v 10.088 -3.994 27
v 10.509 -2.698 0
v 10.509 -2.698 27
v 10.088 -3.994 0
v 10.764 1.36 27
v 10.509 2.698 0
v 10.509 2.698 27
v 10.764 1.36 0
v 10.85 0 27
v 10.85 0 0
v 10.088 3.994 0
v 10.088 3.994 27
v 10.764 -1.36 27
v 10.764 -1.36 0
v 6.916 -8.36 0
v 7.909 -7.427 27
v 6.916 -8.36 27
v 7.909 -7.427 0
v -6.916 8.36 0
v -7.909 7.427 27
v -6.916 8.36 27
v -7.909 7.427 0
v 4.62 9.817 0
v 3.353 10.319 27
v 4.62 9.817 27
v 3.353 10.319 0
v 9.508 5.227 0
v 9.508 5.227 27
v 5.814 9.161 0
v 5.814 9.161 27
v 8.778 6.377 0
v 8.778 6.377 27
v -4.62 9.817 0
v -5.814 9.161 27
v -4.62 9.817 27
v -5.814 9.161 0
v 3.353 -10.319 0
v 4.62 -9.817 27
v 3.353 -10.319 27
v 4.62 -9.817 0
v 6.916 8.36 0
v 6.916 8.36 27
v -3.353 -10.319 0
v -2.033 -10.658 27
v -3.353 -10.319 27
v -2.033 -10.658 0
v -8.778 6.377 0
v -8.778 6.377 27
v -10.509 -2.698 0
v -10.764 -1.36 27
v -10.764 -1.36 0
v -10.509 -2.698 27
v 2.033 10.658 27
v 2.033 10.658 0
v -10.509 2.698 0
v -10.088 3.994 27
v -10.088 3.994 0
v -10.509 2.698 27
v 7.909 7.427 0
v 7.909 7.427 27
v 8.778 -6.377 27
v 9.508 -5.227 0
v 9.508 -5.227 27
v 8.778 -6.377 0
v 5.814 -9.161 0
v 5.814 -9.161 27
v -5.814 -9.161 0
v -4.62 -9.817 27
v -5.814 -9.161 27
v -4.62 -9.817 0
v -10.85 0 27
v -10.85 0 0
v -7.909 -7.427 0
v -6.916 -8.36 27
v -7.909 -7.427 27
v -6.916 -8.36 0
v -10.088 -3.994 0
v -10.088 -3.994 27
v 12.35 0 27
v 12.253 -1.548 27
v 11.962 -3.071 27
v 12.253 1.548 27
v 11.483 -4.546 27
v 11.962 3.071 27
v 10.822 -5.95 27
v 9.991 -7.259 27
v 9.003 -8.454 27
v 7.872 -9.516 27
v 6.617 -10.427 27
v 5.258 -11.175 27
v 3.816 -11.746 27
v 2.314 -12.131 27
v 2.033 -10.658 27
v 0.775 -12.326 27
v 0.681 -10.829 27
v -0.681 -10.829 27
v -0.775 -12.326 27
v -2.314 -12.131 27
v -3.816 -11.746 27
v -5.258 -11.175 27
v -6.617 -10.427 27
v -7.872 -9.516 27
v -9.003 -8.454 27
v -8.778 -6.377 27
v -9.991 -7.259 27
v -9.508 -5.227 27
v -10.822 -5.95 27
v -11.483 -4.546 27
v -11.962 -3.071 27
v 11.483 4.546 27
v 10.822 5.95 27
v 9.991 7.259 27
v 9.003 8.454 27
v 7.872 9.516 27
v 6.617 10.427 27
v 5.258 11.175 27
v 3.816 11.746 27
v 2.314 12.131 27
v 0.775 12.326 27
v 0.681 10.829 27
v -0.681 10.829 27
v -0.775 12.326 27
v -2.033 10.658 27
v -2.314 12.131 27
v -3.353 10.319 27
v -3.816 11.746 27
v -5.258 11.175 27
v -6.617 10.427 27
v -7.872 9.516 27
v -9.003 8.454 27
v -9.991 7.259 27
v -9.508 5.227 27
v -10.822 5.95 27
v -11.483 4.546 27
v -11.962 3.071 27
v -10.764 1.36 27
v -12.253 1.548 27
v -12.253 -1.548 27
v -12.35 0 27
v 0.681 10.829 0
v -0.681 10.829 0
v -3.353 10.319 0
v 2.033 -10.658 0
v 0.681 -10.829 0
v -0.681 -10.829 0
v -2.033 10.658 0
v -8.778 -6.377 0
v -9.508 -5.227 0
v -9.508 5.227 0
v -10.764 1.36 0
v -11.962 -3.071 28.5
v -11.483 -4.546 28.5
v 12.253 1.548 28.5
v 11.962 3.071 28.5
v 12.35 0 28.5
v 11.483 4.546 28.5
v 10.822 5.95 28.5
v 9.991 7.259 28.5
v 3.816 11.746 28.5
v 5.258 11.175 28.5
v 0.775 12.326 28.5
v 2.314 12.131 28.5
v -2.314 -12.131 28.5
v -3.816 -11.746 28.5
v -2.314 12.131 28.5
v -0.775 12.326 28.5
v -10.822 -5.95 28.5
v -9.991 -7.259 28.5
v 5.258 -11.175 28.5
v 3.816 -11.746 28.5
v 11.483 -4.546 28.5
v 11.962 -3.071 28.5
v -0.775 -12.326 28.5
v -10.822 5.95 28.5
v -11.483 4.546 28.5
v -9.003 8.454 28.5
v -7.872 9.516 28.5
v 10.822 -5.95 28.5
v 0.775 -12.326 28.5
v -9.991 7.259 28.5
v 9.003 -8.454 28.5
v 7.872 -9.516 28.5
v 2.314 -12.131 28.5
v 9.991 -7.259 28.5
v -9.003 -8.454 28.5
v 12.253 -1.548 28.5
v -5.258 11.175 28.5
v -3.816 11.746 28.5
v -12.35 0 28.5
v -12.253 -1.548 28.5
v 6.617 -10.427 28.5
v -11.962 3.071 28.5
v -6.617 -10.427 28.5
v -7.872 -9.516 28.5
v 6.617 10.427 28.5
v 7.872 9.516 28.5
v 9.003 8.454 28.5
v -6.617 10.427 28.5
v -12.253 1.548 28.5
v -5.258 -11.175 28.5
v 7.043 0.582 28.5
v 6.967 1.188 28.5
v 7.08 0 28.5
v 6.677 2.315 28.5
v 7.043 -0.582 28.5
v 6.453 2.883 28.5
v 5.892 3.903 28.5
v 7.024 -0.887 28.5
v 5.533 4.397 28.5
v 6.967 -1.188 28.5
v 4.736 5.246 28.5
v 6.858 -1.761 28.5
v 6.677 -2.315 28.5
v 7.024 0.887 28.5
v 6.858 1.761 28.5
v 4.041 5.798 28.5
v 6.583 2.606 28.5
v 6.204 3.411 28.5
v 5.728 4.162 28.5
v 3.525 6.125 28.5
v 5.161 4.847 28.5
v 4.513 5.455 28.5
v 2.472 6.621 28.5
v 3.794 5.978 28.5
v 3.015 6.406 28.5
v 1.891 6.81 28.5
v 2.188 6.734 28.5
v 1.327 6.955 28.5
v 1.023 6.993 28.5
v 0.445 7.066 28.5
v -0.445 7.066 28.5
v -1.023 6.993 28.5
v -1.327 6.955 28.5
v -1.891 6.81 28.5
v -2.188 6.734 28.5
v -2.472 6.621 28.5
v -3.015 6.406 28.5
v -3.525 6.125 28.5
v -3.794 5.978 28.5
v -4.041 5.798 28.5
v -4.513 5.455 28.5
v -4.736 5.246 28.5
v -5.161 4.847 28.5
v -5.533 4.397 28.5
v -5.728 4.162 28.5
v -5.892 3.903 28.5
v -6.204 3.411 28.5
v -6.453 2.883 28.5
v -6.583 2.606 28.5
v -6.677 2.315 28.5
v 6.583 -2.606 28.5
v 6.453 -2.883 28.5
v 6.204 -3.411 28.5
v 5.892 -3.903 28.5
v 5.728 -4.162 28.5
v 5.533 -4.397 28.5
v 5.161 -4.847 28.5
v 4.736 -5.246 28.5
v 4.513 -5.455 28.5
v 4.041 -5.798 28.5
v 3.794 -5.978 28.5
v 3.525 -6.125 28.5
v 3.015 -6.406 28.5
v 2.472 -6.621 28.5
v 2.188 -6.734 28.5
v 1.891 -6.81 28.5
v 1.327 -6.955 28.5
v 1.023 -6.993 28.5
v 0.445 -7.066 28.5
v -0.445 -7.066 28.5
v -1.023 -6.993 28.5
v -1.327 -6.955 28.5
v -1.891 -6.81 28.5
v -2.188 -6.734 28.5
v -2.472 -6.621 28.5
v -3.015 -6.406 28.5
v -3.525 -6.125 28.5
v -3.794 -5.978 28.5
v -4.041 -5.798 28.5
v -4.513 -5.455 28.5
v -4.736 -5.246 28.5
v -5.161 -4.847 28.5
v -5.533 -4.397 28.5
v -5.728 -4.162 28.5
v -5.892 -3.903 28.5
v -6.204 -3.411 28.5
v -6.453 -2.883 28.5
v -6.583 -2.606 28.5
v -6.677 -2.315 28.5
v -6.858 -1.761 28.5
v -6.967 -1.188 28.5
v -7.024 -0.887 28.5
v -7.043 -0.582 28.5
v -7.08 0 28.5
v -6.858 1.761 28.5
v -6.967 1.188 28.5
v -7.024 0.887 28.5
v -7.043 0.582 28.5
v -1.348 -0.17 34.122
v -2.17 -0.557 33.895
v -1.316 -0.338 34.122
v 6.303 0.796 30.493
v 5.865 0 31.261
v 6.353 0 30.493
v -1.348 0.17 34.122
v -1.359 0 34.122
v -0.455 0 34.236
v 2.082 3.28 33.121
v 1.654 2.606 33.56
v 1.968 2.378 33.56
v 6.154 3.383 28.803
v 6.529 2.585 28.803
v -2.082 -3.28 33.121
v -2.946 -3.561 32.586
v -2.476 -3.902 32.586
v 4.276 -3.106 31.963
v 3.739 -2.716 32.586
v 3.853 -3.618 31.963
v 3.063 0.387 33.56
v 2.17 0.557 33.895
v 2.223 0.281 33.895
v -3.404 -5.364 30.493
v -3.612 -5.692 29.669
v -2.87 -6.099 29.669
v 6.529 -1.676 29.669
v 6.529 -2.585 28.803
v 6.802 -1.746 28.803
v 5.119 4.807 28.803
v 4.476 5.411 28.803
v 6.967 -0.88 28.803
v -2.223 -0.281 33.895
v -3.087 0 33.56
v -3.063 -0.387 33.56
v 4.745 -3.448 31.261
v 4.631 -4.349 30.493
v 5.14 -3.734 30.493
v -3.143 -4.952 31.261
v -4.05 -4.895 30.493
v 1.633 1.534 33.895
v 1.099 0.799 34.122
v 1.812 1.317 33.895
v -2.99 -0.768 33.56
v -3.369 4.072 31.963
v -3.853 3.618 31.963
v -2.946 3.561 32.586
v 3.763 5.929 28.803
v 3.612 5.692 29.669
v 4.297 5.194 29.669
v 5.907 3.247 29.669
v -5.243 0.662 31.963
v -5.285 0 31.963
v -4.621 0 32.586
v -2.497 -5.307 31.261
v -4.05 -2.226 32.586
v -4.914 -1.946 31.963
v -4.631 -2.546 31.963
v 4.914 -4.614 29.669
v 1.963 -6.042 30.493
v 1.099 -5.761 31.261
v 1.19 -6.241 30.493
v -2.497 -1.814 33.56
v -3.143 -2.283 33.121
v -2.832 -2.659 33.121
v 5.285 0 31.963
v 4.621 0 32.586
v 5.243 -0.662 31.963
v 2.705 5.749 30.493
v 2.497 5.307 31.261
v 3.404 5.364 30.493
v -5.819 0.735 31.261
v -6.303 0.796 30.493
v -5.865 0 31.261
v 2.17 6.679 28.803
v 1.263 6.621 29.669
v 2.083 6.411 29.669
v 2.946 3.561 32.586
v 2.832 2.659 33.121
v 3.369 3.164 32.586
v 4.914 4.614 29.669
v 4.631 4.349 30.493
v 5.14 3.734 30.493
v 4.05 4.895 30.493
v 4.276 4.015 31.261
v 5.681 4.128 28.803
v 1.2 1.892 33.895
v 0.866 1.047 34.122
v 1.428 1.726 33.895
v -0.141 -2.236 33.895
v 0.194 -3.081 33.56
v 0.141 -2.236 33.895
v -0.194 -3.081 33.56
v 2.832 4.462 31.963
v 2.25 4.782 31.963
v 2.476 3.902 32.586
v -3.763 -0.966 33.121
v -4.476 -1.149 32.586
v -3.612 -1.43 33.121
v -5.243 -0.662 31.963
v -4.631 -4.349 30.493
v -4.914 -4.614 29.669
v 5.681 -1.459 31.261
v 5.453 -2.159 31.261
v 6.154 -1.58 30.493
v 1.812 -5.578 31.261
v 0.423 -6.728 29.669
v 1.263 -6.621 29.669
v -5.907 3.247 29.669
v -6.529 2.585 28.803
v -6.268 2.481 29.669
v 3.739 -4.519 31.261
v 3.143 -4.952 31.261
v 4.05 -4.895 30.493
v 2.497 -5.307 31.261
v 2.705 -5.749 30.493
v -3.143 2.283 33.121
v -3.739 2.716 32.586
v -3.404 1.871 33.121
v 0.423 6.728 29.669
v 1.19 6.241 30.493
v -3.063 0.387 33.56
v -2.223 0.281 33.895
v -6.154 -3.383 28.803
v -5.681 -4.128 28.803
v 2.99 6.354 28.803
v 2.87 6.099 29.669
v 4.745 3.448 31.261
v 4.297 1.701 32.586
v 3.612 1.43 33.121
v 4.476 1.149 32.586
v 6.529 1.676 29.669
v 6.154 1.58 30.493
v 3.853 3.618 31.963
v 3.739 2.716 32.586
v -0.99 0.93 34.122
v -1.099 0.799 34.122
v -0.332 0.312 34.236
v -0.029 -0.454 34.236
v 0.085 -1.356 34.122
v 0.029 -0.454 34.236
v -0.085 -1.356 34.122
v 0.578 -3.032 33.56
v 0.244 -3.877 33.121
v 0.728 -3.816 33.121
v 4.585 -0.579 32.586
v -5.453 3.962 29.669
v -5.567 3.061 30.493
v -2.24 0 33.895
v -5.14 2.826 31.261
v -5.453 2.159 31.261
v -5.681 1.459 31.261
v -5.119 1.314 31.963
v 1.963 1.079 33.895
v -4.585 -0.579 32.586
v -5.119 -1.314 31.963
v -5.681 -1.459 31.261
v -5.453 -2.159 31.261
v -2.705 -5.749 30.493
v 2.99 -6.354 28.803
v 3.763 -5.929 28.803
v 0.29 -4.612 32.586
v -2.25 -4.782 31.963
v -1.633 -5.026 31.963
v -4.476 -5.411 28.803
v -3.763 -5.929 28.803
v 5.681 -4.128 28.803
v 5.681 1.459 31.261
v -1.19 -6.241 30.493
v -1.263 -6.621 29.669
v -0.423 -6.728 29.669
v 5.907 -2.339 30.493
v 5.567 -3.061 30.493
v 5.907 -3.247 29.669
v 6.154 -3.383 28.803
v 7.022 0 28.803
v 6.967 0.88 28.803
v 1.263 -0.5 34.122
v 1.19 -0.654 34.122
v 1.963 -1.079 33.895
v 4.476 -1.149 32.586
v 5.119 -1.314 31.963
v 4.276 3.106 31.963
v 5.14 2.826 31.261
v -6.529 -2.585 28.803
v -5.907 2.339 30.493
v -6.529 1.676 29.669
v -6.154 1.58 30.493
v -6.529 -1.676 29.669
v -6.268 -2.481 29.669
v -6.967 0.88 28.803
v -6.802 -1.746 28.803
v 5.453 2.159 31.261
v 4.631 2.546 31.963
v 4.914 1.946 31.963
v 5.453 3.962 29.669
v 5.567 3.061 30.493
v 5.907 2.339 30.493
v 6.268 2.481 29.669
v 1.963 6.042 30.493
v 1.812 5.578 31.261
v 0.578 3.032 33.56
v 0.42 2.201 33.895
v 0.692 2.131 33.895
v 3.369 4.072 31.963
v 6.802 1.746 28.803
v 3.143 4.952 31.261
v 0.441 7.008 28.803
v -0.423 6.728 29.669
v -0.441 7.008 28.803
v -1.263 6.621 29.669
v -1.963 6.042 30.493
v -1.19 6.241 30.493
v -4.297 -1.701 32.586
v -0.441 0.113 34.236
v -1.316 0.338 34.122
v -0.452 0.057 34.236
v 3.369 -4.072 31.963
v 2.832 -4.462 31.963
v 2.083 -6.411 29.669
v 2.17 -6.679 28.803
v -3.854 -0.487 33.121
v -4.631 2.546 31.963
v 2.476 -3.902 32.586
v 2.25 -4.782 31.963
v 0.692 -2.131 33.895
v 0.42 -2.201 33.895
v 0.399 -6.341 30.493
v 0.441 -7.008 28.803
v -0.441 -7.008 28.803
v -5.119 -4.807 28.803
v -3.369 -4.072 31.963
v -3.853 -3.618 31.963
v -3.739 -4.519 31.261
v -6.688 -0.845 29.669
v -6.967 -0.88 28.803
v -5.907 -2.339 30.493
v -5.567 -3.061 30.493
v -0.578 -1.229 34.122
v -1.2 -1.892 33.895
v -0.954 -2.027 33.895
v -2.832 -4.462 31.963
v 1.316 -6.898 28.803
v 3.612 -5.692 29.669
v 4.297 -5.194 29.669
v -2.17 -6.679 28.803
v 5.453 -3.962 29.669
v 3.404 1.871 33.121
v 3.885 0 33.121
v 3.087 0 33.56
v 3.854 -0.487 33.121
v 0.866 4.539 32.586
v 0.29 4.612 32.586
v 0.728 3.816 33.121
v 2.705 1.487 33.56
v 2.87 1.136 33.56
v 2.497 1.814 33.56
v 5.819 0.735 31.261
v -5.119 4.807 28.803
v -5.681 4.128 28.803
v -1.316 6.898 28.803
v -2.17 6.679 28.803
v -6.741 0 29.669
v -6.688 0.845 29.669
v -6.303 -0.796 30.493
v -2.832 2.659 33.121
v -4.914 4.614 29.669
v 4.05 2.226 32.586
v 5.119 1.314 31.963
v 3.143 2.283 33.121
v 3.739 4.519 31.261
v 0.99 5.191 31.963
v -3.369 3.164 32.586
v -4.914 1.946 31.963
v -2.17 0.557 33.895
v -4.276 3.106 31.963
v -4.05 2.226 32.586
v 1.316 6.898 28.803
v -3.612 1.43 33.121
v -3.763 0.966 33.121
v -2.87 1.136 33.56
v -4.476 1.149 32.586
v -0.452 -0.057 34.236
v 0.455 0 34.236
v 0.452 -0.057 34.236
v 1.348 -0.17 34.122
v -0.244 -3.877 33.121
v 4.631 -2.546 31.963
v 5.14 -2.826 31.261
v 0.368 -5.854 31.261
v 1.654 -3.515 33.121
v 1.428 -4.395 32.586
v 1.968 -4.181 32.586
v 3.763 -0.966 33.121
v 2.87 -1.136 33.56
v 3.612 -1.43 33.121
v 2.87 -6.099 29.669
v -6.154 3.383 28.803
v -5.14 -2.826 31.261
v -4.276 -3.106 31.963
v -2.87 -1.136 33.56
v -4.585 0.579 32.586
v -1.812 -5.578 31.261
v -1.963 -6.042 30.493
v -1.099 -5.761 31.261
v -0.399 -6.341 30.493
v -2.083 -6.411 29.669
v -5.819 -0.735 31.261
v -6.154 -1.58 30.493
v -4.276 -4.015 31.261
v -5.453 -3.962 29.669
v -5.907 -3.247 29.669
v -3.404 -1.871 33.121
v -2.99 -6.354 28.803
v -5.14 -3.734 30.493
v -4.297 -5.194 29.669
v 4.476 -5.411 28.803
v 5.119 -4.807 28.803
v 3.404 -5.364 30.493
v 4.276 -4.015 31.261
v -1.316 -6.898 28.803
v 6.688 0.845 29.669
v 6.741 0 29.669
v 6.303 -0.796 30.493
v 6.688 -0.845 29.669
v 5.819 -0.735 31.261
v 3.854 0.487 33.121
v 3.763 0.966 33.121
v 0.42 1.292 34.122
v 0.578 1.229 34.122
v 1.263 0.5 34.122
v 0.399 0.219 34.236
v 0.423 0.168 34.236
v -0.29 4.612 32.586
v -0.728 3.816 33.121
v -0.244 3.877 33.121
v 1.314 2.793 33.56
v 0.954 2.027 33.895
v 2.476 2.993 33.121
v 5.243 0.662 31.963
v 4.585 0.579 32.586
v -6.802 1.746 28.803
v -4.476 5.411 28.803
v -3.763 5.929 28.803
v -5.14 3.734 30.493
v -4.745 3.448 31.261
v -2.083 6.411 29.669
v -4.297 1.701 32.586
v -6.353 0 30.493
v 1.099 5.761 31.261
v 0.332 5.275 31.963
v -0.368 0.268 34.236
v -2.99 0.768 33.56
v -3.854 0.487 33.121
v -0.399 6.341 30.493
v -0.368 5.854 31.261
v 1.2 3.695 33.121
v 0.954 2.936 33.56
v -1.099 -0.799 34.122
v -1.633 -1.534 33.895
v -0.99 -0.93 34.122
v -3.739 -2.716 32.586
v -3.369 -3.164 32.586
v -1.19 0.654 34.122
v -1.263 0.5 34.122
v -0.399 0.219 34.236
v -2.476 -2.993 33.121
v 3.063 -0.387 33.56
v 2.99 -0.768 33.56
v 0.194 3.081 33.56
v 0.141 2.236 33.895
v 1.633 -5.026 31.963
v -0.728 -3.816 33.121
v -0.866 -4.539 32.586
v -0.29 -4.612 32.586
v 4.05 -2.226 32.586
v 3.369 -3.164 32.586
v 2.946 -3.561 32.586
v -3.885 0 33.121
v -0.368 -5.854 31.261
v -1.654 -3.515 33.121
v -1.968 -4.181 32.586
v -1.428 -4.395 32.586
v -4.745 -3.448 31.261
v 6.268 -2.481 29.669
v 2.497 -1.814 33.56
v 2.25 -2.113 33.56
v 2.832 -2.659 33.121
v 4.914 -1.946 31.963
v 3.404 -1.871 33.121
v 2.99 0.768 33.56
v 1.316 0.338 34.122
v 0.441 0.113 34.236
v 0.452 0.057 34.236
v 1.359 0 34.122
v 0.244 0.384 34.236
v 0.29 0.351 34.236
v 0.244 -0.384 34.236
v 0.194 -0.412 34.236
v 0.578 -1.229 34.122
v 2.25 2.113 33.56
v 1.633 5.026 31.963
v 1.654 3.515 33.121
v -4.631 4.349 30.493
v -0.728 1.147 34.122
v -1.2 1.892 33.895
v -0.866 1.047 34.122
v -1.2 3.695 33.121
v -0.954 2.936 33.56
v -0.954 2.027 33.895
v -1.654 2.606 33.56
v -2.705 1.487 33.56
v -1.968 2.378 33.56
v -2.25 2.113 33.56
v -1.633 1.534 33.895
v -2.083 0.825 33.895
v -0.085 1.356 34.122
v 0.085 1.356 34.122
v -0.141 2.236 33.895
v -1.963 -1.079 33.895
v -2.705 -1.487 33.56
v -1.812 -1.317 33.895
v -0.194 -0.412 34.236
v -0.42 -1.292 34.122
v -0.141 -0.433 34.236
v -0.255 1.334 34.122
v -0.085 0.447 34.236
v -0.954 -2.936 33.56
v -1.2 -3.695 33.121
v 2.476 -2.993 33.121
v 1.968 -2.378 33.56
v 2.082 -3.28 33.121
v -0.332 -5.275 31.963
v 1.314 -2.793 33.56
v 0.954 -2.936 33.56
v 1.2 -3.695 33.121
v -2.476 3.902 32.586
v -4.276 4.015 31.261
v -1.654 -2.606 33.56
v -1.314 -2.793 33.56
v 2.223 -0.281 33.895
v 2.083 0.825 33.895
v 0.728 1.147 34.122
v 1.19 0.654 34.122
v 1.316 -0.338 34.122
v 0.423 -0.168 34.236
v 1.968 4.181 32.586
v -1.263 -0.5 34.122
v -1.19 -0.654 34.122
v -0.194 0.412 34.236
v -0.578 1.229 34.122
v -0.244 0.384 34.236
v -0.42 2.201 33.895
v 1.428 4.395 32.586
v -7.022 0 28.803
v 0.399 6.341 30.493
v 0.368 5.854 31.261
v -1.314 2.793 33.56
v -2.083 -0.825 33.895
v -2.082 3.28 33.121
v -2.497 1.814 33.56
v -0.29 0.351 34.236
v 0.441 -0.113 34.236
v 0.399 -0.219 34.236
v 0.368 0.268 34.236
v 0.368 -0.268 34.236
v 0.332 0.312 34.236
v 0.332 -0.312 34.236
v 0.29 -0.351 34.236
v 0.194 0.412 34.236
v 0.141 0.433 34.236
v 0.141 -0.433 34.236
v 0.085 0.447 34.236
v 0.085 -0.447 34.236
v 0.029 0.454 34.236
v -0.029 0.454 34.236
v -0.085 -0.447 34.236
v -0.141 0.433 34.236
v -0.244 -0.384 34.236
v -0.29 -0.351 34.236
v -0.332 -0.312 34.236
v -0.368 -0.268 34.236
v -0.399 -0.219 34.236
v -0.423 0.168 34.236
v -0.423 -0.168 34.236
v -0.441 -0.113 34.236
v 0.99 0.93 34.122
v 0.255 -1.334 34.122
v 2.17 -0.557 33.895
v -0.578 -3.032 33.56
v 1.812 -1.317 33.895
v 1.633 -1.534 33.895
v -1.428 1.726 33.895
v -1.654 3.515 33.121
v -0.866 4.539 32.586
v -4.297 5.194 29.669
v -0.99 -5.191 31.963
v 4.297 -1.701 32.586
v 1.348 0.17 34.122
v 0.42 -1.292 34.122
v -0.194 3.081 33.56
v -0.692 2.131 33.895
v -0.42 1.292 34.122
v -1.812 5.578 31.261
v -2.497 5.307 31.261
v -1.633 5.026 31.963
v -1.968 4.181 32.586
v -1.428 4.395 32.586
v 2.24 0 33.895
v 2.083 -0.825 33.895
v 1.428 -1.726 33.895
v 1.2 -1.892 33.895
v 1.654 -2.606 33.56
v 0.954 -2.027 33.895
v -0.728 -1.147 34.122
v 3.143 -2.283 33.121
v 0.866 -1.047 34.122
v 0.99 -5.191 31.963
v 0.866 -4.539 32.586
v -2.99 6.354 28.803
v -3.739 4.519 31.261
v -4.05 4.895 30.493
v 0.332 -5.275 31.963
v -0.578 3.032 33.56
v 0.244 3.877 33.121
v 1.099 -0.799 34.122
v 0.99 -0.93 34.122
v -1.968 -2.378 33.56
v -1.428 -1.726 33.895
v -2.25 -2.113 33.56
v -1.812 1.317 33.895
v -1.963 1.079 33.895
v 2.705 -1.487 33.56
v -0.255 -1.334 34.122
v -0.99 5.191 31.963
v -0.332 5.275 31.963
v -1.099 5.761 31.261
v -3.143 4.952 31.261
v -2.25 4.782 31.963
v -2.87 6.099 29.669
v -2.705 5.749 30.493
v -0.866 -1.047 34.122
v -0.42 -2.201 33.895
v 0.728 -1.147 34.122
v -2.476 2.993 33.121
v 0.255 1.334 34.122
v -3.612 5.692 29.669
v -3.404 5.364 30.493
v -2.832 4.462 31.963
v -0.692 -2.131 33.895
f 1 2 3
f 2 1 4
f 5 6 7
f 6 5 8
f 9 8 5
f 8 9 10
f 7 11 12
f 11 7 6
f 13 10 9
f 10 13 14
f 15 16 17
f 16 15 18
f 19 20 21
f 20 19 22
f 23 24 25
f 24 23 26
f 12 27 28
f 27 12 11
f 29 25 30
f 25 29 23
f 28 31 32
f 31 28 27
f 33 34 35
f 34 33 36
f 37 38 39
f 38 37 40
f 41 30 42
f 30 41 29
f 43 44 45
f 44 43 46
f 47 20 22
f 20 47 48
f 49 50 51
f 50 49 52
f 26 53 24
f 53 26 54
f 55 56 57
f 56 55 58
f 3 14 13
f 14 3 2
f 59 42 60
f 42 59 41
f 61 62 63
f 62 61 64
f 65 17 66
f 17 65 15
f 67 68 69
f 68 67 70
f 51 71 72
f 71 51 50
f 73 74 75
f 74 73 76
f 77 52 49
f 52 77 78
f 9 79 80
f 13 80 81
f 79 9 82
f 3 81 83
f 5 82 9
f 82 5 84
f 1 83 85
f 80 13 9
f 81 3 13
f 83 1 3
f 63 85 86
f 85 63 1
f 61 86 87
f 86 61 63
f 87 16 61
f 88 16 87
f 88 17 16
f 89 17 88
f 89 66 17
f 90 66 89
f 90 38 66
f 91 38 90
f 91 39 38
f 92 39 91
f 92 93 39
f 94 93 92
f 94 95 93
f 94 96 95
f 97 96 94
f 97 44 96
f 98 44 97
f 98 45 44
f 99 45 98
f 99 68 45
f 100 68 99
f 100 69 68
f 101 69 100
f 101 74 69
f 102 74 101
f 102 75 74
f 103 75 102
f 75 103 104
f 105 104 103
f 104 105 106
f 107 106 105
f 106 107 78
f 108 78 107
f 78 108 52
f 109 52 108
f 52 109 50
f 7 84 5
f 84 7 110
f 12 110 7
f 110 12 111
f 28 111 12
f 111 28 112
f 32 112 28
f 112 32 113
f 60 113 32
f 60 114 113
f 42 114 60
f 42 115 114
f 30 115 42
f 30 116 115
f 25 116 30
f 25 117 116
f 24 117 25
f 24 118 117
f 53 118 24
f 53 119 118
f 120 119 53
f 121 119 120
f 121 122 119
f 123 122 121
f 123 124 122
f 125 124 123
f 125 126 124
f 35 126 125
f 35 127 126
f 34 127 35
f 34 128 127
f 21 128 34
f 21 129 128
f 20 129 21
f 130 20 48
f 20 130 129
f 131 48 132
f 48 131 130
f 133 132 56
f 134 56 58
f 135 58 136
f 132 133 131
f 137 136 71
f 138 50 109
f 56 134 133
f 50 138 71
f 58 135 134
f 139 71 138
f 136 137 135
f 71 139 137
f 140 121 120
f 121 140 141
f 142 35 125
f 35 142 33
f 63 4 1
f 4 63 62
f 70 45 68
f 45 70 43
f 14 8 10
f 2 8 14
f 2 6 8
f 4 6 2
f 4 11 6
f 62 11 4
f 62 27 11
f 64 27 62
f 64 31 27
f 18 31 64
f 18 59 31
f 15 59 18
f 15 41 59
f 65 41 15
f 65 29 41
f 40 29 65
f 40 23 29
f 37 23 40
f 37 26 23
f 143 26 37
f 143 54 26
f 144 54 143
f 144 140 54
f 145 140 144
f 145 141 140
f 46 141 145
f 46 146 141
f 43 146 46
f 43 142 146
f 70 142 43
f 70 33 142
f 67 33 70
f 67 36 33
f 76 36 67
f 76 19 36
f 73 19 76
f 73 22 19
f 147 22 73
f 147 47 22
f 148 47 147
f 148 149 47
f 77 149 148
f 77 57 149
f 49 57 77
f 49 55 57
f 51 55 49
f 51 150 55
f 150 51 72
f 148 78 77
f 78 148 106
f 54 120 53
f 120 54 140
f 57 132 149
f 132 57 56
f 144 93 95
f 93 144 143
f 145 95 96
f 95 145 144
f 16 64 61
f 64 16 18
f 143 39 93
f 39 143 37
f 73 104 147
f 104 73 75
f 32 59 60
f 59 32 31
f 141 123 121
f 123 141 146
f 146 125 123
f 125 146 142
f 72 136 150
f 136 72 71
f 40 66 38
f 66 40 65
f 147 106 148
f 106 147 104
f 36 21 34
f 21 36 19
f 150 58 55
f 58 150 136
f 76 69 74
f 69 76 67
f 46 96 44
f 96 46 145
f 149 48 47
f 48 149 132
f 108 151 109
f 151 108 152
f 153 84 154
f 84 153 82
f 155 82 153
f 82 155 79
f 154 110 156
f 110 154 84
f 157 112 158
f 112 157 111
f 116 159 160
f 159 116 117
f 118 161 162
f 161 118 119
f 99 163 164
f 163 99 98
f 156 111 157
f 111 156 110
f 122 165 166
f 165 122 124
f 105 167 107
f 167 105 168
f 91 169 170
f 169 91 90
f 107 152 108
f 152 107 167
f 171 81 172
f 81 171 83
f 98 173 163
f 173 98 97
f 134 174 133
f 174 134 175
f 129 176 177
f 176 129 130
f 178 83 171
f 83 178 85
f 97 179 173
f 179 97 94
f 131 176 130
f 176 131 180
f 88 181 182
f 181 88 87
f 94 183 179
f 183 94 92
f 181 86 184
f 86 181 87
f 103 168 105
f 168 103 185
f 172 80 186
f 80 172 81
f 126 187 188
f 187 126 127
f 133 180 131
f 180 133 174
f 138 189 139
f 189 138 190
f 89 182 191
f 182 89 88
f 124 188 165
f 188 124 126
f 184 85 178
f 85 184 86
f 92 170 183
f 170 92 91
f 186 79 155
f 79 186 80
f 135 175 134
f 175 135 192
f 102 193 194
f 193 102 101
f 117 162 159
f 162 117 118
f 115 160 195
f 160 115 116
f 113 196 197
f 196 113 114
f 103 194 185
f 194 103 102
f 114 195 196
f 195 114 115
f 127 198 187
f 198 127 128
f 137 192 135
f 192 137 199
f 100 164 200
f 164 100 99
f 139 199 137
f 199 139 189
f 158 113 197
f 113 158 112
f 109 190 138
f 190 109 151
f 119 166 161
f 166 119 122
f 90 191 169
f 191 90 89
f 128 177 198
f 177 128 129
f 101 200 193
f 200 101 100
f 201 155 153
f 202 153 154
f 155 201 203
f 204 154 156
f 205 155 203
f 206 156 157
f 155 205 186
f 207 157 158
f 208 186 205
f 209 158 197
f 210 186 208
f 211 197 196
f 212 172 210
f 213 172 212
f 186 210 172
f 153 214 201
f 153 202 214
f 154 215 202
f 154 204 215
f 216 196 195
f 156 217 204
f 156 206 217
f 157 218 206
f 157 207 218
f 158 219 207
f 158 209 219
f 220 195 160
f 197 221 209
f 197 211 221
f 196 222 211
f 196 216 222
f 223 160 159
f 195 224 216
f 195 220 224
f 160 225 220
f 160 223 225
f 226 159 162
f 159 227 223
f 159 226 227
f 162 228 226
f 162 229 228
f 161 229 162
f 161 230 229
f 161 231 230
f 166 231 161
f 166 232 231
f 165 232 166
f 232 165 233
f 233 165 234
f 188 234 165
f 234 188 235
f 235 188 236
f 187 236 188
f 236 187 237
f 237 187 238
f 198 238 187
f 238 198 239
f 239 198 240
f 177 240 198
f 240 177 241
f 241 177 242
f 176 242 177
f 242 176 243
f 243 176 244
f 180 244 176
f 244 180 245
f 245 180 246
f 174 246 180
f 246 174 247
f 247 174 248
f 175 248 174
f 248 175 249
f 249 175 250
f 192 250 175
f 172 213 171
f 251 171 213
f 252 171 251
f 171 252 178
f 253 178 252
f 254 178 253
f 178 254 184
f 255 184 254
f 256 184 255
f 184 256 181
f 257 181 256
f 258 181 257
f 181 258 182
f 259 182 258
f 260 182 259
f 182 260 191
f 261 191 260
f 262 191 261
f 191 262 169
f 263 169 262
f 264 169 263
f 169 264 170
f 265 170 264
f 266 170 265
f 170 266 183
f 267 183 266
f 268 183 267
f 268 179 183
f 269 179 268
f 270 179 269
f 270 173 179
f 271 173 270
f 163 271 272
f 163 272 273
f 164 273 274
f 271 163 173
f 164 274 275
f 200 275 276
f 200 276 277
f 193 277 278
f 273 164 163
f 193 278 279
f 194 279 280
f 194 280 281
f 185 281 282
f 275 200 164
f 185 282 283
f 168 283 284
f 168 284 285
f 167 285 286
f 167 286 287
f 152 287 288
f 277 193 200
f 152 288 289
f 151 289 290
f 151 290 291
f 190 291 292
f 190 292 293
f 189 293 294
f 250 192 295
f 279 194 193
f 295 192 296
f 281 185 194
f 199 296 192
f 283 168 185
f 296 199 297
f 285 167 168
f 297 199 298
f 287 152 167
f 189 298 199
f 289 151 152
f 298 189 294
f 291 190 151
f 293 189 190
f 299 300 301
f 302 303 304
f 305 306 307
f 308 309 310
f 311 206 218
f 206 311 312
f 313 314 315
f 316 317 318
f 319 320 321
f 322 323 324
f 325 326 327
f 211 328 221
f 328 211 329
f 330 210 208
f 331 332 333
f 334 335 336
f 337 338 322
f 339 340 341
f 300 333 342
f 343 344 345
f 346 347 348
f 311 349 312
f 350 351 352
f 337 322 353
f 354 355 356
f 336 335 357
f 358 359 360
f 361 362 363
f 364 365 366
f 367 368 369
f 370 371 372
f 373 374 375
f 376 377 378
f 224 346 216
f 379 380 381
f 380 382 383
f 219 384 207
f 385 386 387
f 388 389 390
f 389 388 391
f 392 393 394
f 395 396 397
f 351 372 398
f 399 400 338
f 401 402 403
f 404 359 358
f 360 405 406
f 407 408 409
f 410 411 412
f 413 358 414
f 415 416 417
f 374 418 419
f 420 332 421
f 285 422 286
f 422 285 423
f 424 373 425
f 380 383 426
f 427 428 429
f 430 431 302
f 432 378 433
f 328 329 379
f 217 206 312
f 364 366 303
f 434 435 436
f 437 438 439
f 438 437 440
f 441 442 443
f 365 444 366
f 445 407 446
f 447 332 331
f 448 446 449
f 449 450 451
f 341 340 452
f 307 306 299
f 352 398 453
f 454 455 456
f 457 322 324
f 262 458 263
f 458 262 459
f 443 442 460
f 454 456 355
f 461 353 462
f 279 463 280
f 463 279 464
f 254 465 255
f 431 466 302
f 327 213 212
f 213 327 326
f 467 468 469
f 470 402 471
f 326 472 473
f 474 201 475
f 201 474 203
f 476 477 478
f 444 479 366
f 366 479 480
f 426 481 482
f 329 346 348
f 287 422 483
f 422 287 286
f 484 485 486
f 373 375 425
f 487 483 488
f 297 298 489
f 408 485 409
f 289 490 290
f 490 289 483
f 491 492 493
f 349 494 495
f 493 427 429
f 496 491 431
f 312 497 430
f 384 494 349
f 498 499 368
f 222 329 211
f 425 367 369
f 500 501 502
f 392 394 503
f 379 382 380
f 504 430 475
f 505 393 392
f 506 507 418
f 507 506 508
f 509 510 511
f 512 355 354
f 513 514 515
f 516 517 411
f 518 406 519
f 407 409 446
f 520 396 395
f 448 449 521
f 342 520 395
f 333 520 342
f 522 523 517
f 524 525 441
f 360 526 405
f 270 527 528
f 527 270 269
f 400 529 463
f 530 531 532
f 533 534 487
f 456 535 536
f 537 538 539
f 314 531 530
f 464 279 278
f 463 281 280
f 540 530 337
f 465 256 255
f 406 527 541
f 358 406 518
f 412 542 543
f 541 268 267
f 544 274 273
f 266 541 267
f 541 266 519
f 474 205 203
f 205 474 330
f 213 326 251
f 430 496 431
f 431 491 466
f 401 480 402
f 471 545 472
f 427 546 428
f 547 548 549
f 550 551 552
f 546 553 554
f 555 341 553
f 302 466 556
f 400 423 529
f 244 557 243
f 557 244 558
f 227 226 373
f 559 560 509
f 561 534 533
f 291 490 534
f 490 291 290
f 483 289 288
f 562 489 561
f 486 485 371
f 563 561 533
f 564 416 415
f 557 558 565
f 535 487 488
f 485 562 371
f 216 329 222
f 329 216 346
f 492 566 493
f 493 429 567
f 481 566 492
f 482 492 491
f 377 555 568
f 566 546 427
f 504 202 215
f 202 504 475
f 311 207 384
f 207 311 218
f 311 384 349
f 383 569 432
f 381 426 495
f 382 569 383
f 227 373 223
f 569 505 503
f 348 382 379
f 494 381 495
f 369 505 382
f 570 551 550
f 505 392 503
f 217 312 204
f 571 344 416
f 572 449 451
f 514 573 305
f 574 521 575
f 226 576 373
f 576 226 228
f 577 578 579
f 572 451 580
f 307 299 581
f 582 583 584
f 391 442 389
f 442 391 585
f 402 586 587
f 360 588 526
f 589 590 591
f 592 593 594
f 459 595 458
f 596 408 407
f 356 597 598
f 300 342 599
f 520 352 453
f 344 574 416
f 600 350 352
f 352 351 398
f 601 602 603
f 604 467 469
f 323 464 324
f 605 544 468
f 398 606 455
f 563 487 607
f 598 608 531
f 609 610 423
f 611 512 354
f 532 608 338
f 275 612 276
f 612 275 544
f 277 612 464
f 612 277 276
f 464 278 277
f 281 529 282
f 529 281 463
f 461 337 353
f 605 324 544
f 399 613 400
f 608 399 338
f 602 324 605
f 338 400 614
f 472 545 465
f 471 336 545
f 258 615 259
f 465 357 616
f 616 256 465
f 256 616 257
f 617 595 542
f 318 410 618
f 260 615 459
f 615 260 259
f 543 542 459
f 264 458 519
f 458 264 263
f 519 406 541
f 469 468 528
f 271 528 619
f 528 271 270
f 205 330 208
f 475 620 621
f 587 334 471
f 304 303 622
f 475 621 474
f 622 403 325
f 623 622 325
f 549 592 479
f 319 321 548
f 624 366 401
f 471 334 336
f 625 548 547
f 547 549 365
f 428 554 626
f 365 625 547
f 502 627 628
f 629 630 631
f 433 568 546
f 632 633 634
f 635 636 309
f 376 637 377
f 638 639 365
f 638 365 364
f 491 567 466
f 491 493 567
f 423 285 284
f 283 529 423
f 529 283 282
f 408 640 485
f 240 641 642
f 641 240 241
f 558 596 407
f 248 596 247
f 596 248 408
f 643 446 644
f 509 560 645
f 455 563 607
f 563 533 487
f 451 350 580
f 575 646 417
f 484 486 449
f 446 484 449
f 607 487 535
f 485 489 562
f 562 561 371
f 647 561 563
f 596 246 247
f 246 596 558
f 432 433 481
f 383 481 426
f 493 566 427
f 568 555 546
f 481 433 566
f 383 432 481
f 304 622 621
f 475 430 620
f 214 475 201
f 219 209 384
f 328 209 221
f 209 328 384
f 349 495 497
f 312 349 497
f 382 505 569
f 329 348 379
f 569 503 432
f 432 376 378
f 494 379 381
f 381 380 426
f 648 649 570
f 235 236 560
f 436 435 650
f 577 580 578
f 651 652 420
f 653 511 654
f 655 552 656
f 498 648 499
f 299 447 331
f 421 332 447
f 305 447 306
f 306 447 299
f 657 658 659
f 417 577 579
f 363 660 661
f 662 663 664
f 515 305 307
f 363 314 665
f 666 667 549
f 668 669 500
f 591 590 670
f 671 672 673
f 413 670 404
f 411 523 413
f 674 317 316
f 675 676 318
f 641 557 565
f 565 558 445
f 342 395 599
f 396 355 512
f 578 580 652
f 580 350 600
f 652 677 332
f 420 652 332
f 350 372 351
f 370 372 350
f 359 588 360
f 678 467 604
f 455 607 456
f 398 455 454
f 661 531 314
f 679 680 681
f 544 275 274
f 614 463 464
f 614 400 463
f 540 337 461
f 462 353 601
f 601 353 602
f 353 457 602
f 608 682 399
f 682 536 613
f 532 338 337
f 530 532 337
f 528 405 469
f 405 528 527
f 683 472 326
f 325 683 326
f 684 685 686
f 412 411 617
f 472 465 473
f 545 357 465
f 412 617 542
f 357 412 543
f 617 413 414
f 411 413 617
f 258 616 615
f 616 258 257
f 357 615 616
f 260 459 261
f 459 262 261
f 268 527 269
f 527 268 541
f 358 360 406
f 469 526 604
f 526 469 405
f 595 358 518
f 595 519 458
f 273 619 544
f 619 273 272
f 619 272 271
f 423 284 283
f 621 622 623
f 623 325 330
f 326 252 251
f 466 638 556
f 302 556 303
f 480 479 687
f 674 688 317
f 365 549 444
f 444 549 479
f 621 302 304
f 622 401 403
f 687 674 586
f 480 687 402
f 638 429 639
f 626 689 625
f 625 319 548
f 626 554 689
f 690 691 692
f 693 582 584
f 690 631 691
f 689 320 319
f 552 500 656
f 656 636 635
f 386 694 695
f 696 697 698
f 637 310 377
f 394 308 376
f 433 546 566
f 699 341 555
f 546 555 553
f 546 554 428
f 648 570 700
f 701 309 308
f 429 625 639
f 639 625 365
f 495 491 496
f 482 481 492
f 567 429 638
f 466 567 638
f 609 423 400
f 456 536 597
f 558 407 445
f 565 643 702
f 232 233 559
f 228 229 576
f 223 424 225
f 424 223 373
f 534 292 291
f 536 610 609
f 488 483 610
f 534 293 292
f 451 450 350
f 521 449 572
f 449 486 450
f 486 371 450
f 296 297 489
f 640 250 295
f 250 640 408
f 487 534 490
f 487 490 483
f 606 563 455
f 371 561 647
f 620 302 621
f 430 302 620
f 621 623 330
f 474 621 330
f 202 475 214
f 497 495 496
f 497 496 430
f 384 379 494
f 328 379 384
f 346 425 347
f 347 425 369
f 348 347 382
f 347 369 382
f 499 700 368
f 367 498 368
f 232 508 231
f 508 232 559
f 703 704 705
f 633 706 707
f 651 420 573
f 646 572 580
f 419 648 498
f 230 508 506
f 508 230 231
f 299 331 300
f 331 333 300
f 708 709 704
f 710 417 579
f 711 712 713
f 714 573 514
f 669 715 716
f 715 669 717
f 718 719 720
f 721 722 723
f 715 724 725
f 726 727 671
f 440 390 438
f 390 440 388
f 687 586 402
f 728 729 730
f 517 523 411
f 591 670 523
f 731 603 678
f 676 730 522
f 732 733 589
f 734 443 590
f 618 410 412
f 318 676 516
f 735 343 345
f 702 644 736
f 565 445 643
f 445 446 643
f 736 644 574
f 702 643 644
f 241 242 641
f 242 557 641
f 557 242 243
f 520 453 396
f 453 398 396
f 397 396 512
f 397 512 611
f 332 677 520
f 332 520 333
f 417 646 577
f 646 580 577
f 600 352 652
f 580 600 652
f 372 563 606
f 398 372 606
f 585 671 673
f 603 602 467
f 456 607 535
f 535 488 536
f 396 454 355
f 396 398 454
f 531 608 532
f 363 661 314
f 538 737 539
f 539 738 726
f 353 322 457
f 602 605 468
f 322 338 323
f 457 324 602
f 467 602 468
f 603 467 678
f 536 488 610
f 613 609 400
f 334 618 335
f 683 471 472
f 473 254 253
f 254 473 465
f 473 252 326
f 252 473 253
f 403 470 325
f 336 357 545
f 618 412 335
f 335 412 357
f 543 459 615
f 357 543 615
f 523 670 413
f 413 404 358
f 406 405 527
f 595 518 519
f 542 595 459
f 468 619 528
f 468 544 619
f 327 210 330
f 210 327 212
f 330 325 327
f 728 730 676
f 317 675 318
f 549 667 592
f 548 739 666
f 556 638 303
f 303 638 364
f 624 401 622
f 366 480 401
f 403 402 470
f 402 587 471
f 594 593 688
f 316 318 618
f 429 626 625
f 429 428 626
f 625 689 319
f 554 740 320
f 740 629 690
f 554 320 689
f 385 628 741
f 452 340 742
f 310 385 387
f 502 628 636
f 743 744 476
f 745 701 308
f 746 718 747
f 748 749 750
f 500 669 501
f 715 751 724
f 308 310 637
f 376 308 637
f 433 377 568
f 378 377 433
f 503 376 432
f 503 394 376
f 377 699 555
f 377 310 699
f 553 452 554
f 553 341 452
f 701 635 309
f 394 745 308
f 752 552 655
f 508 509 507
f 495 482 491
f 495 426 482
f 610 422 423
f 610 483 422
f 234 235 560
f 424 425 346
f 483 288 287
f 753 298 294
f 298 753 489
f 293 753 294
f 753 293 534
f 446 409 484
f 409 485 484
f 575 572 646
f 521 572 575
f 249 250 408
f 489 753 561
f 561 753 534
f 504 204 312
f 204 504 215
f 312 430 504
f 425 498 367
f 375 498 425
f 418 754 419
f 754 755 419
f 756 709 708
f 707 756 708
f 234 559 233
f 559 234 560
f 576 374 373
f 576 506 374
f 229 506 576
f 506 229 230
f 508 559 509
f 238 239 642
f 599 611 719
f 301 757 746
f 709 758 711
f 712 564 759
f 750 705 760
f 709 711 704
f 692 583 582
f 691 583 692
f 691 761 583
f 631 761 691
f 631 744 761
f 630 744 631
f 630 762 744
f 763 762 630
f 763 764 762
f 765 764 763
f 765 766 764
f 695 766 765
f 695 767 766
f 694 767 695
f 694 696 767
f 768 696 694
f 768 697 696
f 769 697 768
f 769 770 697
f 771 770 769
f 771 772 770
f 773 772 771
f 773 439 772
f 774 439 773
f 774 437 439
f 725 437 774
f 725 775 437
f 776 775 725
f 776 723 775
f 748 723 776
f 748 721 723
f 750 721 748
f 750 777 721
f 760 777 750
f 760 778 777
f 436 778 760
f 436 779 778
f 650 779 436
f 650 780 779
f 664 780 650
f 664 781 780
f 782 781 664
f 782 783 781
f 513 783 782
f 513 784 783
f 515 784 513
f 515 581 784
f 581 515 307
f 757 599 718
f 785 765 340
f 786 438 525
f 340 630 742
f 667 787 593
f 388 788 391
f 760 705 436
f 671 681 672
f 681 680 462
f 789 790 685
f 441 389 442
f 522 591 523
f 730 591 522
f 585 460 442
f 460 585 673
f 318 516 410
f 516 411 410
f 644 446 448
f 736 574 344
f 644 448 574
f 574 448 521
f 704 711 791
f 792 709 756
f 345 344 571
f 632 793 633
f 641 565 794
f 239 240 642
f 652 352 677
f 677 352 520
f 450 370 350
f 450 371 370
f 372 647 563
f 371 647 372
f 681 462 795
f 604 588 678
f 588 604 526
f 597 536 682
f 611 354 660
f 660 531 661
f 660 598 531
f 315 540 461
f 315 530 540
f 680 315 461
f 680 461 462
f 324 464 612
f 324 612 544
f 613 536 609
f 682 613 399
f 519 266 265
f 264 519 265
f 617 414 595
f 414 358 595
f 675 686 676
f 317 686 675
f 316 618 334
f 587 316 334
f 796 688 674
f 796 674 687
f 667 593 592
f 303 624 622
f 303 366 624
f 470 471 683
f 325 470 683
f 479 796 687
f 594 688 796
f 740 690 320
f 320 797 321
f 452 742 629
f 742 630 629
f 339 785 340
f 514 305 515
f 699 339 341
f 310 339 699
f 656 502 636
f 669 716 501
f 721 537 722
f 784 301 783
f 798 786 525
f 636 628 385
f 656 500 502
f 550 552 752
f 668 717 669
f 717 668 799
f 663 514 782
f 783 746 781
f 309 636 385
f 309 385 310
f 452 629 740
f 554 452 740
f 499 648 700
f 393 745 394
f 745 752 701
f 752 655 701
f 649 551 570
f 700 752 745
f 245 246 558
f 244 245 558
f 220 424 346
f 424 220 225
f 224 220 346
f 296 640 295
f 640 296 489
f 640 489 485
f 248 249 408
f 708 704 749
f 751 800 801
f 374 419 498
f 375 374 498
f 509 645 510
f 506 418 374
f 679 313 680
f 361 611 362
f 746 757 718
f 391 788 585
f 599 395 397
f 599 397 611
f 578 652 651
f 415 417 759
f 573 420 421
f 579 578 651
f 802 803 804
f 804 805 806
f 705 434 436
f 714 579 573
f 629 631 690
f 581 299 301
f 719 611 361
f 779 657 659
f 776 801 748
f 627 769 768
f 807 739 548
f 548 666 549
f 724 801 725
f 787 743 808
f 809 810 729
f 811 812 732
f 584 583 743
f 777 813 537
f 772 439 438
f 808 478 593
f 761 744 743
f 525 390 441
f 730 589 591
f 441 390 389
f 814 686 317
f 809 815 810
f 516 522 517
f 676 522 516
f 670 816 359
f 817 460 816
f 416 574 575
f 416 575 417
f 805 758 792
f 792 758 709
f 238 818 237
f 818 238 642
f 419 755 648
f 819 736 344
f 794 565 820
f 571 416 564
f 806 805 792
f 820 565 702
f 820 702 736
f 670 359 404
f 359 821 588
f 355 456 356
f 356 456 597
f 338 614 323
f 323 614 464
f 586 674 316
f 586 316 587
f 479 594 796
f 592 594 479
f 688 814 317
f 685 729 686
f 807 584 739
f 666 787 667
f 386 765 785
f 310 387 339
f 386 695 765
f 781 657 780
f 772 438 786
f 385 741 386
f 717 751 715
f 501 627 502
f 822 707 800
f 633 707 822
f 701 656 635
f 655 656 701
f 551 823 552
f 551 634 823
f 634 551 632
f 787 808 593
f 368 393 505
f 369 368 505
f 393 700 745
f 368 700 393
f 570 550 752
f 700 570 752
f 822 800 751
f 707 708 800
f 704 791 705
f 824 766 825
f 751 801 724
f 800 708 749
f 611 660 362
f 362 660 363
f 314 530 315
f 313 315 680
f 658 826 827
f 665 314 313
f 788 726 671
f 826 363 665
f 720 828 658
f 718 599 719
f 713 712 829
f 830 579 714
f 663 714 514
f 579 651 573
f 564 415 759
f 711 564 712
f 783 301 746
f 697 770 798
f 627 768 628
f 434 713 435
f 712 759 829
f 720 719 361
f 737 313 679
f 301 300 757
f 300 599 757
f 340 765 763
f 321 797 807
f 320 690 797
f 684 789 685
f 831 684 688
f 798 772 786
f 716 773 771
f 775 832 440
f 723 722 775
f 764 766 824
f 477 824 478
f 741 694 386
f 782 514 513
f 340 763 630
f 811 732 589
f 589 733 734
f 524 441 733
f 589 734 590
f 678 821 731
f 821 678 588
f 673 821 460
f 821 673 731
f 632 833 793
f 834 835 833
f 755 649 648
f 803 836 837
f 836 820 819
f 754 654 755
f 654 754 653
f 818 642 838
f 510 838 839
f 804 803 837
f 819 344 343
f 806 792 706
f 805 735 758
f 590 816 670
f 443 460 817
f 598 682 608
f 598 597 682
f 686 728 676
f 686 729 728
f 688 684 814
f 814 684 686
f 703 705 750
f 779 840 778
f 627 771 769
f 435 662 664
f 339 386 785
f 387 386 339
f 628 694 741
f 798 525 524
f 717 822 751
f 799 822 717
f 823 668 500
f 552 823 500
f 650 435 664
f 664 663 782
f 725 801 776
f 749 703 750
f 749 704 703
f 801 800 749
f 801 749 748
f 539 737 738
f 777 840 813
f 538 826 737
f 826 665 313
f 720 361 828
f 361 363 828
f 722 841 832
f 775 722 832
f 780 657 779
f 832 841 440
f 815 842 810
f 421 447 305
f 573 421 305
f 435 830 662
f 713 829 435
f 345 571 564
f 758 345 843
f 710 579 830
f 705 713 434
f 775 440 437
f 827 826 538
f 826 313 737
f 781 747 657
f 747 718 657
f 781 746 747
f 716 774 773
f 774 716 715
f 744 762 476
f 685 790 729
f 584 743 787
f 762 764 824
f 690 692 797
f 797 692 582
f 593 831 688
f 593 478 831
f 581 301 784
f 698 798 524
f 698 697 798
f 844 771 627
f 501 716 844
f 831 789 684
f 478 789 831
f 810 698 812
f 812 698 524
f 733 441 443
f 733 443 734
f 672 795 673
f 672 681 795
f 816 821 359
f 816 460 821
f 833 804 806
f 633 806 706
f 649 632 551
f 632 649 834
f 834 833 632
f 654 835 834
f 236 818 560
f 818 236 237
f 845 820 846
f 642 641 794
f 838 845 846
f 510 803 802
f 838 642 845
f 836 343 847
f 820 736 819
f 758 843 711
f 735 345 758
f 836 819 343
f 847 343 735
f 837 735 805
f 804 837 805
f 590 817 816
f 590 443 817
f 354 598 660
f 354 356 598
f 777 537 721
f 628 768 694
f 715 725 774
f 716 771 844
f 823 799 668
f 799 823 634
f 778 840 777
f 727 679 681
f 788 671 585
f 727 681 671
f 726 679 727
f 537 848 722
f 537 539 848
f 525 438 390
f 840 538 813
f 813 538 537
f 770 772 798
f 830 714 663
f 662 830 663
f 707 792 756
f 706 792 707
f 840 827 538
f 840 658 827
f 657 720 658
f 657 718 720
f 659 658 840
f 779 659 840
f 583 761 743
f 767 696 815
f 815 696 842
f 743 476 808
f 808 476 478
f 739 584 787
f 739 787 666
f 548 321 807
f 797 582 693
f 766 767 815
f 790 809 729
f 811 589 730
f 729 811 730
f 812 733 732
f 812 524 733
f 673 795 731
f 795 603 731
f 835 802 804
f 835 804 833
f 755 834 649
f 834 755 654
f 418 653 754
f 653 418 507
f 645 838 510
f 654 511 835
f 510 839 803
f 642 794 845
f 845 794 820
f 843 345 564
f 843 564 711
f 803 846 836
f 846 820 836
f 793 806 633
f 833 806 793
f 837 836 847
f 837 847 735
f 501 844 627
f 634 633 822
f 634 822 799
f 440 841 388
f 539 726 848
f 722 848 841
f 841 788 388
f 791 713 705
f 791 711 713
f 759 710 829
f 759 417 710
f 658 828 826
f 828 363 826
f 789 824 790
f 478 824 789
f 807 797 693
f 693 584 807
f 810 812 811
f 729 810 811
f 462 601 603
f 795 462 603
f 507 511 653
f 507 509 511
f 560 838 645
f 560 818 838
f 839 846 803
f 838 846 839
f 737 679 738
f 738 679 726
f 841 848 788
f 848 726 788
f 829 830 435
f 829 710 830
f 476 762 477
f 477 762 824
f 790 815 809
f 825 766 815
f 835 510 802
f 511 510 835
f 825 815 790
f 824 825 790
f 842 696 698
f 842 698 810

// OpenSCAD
$fn=50;

cylinderDiameter = 21.7;
cylinderHeight = 27;

capDiameter = cylinderDiameter + 3;
capLoc = cylinderHeight;
capHeight = 1.5;

sphereLoc = capLoc;
sphereDiameter = 14.5;

module doorPlug() {
    union() {
        cylinder(d=cylinderDiameter, cylinderHeight);

        translate([0,0,capLoc])
        cylinder(d=capDiameter, capHeight);

        translate([0,0,sphereLoc])
        sphere(d=sphereDiameter);
    }
}

doorPlug();
